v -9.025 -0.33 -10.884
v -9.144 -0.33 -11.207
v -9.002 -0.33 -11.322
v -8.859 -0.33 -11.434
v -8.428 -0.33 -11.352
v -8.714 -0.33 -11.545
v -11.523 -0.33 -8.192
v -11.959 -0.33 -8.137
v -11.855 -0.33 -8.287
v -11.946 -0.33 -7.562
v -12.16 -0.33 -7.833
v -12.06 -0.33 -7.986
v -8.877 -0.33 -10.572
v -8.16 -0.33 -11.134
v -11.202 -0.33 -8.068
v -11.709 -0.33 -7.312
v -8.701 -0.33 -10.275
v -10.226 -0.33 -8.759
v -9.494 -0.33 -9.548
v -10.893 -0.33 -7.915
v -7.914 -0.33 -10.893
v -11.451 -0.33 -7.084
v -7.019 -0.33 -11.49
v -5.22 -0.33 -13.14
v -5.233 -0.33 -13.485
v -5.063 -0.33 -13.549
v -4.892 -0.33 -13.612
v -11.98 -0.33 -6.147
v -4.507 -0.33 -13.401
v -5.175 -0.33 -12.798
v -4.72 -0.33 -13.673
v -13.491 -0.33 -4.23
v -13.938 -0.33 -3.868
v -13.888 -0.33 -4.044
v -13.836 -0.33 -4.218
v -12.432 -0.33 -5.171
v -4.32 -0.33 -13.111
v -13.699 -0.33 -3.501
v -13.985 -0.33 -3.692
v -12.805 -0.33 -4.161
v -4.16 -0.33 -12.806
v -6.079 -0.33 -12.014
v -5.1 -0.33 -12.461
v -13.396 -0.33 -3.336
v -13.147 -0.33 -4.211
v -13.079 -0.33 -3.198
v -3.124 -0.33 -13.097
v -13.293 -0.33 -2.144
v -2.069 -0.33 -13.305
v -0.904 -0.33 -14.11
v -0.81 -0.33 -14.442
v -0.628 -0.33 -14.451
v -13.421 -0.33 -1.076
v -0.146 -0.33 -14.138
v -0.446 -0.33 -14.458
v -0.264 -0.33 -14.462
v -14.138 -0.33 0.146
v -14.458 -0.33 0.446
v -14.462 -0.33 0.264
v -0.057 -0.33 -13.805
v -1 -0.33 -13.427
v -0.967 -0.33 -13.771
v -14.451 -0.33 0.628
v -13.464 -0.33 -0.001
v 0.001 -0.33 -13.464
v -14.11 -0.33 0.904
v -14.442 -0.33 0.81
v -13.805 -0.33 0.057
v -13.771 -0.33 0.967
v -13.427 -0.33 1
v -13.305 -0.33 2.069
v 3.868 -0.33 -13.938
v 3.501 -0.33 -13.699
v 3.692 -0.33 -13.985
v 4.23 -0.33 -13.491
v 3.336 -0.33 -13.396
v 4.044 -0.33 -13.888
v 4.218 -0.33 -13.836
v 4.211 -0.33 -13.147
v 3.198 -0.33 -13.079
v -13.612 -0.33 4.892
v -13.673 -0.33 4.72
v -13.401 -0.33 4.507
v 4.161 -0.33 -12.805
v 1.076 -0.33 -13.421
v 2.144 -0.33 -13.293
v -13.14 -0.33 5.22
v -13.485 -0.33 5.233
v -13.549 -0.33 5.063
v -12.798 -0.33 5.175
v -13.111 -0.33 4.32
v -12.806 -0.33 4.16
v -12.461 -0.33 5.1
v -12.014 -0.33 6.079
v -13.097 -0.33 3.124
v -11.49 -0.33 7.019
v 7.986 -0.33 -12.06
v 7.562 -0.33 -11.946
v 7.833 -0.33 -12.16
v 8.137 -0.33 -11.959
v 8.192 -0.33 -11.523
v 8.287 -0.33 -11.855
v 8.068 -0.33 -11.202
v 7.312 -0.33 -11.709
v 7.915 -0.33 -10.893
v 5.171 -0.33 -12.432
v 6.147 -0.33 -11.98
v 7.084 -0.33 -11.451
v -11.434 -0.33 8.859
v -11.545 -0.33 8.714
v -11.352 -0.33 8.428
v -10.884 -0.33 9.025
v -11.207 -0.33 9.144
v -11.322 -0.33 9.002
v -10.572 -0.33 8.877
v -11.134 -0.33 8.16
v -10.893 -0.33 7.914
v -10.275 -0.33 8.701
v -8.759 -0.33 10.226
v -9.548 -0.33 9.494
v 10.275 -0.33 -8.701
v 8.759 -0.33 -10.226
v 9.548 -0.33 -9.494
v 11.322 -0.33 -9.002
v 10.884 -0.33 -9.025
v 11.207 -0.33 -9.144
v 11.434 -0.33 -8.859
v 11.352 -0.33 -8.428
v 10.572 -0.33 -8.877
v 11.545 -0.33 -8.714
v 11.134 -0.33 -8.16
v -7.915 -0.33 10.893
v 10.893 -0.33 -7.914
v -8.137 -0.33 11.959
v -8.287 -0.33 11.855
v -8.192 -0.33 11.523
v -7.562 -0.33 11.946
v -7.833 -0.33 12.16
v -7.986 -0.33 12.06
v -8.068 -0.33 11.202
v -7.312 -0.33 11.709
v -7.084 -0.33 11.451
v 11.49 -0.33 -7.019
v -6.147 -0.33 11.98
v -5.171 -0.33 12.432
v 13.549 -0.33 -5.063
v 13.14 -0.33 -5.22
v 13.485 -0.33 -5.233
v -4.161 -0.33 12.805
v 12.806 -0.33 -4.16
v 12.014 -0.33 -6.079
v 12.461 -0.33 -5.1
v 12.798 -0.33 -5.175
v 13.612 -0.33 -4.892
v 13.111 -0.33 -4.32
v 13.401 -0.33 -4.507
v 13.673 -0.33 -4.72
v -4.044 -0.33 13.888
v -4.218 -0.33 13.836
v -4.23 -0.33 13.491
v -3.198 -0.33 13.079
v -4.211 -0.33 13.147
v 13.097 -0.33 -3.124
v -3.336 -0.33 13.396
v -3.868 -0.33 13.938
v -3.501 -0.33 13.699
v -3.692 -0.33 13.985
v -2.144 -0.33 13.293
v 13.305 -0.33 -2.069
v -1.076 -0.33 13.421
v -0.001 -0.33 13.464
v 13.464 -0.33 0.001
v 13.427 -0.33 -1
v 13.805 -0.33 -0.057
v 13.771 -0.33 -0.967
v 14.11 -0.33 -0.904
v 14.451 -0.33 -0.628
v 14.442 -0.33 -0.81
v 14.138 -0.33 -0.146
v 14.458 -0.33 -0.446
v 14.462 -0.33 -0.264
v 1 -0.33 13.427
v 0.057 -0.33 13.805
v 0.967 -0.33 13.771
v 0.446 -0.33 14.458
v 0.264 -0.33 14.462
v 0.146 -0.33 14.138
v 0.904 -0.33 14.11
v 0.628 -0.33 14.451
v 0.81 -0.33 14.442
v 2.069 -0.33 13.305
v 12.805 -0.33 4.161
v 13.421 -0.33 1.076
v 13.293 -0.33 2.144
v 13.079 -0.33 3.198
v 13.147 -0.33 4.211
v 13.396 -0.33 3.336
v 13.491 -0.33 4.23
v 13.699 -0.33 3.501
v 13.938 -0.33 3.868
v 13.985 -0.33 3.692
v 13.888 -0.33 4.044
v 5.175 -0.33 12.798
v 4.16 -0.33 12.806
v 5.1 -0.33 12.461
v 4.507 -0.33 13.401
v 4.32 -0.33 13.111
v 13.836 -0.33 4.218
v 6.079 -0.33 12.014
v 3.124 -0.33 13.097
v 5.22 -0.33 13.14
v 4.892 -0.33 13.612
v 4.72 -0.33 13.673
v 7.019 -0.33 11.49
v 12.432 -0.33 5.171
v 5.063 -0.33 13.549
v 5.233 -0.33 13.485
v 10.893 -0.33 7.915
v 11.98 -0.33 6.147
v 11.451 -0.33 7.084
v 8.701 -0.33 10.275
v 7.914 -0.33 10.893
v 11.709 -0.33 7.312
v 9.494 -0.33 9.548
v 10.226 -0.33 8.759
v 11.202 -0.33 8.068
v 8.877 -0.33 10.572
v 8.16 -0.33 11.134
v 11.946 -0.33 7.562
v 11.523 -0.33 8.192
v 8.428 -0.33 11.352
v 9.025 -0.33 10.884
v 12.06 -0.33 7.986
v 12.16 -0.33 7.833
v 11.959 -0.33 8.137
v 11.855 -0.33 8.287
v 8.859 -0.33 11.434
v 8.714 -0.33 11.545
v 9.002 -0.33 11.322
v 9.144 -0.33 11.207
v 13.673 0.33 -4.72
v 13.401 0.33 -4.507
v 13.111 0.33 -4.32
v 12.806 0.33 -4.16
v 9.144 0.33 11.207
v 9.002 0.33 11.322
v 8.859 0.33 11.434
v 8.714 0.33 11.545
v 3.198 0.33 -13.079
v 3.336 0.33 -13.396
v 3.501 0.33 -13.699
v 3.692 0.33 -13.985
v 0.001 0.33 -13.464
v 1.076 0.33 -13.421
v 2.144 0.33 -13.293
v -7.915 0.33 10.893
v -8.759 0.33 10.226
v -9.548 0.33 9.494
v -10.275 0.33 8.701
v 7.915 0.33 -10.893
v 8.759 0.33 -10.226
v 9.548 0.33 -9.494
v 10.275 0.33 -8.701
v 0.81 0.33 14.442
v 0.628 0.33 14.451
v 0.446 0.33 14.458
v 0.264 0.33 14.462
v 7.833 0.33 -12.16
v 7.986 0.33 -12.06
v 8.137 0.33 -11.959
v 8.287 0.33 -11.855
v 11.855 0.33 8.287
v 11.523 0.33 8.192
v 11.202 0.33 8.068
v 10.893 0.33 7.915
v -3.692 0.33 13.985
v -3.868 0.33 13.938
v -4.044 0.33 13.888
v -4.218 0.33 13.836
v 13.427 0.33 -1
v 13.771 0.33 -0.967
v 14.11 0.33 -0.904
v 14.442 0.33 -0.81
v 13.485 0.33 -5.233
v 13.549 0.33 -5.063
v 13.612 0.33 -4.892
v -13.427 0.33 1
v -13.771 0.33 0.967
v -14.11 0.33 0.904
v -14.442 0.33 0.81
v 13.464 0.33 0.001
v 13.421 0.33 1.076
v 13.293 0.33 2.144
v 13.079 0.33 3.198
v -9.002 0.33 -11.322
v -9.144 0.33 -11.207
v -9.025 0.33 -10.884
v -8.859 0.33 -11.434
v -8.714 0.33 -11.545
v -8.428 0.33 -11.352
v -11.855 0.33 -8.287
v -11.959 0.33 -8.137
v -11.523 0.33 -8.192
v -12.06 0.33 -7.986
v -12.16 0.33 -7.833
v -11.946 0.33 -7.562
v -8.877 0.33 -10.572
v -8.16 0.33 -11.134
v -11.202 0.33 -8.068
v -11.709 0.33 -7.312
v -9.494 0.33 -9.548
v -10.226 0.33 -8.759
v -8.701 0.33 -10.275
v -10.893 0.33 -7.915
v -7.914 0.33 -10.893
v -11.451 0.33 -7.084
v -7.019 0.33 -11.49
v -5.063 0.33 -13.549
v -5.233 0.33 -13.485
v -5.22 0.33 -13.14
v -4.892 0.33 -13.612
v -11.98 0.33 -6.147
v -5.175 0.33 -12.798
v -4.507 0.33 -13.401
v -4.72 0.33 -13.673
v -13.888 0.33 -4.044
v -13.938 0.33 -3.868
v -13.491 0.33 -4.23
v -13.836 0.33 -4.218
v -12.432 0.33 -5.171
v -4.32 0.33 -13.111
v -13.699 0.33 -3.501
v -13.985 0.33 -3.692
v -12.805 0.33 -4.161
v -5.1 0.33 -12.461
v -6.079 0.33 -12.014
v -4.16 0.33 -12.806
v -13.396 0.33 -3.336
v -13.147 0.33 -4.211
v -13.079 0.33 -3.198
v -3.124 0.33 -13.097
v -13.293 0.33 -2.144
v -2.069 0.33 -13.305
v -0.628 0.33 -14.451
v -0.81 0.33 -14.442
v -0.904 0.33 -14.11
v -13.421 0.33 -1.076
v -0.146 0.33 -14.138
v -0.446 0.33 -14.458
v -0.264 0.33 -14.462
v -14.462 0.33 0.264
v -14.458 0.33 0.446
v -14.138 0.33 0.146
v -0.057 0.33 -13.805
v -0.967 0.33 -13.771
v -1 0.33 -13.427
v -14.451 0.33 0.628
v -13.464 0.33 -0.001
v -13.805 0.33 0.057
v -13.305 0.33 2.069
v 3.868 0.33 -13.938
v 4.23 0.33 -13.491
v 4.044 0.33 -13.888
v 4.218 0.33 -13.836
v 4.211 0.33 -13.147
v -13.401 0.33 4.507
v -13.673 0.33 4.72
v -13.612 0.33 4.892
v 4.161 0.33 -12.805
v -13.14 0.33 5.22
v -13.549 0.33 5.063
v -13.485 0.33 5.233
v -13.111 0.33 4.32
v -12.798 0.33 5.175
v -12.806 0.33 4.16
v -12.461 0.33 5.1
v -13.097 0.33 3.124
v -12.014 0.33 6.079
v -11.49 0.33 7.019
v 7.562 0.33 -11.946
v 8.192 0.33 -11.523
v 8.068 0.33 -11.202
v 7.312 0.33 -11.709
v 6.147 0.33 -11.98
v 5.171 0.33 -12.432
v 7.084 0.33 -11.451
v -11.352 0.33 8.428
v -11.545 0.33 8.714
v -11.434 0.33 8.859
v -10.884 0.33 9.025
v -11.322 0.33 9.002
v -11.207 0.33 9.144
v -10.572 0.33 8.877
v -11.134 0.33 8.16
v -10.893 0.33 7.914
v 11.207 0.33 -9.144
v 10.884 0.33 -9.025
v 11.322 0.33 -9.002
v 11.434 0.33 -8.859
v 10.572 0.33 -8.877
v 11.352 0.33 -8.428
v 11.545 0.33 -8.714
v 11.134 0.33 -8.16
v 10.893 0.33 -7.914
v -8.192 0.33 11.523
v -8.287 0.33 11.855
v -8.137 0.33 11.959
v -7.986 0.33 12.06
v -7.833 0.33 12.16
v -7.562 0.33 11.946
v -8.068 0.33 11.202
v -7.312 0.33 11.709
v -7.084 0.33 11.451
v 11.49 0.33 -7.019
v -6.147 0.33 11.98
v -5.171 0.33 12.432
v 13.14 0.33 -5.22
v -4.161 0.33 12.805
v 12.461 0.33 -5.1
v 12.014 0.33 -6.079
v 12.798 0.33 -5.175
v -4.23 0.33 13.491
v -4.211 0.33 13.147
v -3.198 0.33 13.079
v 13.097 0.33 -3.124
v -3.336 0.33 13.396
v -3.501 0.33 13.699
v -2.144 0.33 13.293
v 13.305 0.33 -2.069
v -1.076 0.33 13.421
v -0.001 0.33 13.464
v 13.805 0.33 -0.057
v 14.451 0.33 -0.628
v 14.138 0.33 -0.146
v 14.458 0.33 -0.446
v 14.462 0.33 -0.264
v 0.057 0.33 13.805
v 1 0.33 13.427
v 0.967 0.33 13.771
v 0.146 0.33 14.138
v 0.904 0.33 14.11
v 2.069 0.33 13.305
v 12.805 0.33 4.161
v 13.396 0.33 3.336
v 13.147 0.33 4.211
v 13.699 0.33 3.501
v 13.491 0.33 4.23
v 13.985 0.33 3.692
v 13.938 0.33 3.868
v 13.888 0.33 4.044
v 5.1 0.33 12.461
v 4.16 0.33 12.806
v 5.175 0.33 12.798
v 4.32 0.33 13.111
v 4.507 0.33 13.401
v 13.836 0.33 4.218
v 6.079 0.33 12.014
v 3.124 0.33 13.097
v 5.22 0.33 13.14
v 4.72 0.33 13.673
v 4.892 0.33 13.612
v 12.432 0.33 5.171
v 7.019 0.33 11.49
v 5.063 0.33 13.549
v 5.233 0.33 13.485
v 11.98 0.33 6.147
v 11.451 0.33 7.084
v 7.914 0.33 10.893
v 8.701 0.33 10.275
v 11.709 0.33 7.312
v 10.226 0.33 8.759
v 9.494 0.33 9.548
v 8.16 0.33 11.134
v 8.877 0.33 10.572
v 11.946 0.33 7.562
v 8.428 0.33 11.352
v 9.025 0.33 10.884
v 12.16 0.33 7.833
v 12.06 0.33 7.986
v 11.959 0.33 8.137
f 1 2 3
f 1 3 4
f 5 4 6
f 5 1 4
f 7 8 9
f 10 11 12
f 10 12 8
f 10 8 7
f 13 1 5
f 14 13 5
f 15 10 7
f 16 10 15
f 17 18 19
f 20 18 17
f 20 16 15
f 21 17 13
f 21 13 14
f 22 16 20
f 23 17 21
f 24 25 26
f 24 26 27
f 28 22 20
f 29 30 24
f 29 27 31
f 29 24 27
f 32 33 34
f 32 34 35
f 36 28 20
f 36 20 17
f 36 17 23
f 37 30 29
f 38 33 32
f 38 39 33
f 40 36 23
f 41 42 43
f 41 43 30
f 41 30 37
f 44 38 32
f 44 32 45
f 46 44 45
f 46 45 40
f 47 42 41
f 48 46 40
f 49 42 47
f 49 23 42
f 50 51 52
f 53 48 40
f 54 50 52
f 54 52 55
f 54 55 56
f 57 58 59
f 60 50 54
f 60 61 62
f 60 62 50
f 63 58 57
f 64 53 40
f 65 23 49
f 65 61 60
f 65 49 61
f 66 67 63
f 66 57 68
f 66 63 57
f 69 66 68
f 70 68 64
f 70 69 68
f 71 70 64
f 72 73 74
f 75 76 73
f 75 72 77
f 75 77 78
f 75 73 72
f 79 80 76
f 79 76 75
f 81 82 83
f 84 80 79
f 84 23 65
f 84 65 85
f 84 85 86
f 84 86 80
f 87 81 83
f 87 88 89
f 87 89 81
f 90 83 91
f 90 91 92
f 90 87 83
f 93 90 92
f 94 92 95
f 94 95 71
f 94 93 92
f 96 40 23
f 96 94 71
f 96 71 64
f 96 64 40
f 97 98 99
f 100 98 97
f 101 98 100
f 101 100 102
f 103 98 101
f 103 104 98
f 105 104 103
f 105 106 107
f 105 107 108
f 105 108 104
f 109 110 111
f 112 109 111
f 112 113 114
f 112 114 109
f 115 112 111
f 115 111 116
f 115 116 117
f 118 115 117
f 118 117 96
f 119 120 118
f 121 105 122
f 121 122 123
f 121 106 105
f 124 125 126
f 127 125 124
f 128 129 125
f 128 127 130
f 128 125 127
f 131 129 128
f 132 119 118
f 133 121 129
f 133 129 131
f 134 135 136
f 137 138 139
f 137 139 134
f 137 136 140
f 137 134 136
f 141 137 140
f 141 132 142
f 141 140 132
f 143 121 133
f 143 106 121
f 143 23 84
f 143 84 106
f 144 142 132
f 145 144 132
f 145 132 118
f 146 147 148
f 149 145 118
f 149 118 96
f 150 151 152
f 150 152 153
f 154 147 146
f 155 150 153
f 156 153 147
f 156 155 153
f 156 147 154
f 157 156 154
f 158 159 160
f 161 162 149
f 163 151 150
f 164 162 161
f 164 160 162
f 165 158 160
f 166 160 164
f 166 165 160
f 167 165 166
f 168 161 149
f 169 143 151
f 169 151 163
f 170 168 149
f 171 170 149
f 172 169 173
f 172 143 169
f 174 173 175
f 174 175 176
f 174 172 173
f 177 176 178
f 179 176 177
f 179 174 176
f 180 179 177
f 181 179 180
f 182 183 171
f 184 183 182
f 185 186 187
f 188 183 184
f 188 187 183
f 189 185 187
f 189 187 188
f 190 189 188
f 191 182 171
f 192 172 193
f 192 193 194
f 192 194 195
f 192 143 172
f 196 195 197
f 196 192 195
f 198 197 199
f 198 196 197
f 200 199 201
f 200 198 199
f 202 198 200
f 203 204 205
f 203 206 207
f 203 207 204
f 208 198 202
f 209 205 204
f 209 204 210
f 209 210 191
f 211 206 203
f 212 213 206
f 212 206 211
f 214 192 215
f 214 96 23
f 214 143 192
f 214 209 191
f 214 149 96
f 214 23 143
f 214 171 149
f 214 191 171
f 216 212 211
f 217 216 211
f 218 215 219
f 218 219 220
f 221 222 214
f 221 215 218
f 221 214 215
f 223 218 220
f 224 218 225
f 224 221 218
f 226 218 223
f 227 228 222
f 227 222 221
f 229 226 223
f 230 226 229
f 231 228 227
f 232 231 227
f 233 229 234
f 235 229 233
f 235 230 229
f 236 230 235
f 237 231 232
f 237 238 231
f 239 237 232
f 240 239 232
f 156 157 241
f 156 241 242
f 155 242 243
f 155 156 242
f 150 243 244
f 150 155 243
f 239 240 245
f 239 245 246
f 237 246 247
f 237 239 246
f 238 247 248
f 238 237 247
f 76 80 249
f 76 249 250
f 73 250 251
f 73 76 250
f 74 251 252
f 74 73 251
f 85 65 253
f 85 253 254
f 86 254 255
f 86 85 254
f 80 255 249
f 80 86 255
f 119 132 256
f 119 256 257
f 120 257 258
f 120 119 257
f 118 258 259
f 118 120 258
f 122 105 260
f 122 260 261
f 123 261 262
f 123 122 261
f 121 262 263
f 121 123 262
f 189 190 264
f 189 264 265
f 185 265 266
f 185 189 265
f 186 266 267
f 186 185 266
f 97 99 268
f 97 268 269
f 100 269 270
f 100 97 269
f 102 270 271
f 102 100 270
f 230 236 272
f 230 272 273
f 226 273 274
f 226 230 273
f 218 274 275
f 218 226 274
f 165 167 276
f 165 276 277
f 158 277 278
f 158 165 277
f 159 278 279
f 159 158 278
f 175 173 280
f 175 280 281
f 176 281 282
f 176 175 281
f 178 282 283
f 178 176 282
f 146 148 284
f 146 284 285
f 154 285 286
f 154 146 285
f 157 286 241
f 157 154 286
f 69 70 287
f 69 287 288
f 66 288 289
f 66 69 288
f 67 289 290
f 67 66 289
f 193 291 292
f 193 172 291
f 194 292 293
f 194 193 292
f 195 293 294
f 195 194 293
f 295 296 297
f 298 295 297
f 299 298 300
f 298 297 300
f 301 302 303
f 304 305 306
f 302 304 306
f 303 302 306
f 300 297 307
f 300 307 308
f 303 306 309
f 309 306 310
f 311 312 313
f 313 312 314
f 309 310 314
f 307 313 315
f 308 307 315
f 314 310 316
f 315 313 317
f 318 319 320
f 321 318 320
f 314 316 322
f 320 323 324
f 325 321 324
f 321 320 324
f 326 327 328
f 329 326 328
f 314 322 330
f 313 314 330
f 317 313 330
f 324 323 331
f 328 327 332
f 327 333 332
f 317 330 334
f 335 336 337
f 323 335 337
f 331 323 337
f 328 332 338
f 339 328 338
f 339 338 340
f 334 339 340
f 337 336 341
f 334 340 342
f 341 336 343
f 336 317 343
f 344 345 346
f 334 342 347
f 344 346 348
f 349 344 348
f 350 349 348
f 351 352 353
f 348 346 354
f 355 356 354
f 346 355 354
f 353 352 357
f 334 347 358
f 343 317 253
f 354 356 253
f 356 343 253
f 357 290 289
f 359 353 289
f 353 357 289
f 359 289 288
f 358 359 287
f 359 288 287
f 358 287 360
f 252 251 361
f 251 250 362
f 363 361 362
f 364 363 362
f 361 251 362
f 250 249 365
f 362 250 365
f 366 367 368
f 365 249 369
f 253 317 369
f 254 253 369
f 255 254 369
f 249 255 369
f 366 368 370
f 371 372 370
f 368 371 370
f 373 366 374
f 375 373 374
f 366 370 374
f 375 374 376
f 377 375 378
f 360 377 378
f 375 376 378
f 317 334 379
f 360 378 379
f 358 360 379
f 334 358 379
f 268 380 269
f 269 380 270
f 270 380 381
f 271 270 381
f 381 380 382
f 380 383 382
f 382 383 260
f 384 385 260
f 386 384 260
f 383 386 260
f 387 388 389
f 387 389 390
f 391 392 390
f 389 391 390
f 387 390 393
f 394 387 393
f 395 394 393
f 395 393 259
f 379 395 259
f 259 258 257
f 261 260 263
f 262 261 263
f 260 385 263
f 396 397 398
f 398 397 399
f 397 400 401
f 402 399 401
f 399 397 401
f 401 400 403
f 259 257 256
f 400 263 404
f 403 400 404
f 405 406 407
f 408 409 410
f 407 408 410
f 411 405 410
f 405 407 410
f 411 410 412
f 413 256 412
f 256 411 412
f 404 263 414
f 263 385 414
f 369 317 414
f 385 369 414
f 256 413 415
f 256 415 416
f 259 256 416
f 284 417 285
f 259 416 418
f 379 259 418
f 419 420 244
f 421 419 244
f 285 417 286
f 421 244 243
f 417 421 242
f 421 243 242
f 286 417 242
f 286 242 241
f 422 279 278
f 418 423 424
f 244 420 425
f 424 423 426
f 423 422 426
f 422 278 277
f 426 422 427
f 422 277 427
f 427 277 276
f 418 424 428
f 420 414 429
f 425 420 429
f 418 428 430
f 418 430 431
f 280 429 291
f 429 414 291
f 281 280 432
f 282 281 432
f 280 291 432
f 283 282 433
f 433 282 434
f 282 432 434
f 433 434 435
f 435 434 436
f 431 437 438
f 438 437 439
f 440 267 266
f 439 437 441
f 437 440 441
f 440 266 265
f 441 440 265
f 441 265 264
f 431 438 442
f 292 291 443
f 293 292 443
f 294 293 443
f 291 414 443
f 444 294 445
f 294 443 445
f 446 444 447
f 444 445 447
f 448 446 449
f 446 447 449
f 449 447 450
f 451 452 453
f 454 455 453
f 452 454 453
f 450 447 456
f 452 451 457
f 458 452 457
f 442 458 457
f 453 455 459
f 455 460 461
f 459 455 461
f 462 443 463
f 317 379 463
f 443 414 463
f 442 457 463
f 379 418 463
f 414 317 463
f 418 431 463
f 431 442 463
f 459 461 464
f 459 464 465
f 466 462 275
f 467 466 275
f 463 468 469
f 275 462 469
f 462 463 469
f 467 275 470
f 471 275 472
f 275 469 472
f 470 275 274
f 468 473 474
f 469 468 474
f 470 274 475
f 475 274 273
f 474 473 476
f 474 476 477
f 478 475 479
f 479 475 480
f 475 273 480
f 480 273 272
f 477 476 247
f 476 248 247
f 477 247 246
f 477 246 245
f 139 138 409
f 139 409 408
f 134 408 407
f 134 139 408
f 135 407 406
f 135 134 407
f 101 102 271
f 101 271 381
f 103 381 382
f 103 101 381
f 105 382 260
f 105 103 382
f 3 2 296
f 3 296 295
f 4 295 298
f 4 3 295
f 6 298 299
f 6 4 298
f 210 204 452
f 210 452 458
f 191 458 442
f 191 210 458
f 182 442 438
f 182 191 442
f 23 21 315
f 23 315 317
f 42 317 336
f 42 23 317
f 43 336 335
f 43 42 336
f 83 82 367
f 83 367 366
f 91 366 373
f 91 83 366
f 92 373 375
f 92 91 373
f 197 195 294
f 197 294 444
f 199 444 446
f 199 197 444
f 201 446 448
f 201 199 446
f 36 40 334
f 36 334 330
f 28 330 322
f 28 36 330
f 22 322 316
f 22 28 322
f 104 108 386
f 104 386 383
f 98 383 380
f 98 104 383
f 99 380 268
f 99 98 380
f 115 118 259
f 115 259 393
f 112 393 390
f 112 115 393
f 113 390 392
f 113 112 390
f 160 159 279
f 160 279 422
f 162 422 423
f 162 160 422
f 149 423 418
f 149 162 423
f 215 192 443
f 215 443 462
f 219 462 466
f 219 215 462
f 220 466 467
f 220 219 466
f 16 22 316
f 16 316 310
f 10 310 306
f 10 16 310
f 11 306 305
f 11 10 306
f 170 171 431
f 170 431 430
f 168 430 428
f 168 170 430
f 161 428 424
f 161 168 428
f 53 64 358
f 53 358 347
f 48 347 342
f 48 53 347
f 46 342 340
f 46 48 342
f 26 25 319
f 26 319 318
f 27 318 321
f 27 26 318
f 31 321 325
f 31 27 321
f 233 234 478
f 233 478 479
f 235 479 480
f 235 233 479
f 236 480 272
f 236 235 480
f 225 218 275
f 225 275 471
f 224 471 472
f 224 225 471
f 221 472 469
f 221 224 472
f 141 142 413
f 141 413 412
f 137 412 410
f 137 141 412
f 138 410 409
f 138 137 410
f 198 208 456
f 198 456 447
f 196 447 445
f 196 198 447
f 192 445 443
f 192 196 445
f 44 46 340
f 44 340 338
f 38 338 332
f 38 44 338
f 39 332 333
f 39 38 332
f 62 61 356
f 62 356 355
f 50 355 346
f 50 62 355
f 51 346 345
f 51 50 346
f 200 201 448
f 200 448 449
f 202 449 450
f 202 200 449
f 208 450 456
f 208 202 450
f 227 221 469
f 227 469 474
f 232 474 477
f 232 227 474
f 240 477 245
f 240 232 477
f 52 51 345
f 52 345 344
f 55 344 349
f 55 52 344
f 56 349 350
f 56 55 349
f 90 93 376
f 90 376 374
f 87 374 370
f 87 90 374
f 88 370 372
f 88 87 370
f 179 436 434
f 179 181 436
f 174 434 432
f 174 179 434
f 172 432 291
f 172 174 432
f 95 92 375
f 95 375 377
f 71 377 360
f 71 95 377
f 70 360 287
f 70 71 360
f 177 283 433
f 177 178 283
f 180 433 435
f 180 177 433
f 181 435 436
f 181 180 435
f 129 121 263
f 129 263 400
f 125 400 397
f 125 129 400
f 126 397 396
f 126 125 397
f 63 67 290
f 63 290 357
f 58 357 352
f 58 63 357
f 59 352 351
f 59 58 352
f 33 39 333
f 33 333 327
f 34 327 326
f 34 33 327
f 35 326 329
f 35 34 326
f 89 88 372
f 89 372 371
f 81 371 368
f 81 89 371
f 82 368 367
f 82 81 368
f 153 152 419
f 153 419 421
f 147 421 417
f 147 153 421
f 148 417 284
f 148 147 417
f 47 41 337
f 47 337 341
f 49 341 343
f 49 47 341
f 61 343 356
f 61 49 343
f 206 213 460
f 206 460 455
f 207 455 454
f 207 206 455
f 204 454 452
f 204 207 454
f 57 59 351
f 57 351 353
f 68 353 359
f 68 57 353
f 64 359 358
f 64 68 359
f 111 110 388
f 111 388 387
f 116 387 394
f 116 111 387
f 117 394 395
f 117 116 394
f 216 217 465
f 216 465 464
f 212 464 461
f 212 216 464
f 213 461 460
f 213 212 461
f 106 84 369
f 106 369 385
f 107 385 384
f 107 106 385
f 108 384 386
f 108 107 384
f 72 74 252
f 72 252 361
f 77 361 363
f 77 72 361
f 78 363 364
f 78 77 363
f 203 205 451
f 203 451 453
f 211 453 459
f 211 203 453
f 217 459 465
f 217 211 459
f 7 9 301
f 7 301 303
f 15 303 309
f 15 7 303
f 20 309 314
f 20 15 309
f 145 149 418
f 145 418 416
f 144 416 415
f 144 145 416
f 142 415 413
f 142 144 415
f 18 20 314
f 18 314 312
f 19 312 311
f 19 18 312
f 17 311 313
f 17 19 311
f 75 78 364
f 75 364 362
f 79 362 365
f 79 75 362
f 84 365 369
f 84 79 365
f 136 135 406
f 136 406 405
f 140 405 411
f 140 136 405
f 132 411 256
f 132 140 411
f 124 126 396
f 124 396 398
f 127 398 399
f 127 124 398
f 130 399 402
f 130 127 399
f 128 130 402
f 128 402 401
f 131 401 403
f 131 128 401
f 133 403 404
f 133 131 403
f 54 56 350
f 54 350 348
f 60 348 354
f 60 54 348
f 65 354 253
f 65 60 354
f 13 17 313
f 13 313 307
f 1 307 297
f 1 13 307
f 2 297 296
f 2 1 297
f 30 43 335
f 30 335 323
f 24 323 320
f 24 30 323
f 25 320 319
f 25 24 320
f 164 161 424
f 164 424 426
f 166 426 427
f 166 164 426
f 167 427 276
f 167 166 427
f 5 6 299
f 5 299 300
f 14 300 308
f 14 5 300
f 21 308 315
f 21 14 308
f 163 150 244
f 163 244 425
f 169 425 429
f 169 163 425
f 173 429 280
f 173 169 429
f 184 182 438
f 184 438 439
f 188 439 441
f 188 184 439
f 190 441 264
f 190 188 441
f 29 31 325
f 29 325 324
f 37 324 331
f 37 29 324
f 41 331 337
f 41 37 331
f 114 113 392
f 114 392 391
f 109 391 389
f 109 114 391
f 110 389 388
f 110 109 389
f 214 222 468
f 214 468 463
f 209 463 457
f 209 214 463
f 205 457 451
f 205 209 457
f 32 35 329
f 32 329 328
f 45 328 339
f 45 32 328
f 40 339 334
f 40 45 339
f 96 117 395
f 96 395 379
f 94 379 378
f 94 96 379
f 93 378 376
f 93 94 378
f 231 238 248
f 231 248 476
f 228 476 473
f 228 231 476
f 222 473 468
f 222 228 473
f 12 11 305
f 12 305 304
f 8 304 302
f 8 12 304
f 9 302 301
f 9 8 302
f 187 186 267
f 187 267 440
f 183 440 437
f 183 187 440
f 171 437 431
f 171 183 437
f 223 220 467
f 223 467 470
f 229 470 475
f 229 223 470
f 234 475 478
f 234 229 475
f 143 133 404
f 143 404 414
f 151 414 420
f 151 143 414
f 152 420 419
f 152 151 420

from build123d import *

# Parameters (mm, degrees)
F3_DEPTH      = 0.33
F3_DEPTH_BACK = 0.33


with BuildPart() as f3:
    # F2 (on Front) → F3 (new body, two sides)
    with BuildSketch(Plane.XZ) as f3_sk:
        with BuildLine():
            ThreePointArc((13.427331249, -0.9997678629), (13.4552046036, -0.5002292714), (13.4645, 0))
            ThreePointArc((13.4645, 0), (13.4644999955, 0.0003469704), (13.4644999821, 0.0006939409))
            ThreePointArc((13.4644999821, 0.0006939409), (13.3677602926, 1.6111315933), (13.0790961409, 3.1984378043))
            ThreePointArc((13.0790961409, 3.1984378043), (12.9511444719, 3.68247432), (12.8052860071, 4.1614192922))
            ThreePointArc((12.8052860071, 4.1614192922), (12.215628492, 5.6631423075), (11.4505879751, 7.0835580943))
            ThreePointArc((11.4505879751, 7.0835580943), (11.1793231973, 7.5043649366), (10.8926014181, 7.9147959289))
            ThreePointArc((10.8926014181, 7.9147959289), (9.8677458634, 9.1608051953), (8.7012164773, 10.275290364))
            ThreePointArc((8.7012164773, 10.275290364), (8.3131918771, 10.5916760271), (7.913673109, 10.8934171945))
            ThreePointArc((7.913673109, 10.8934171945), (6.553939517, 11.7617446434), (5.1001092858, 12.4612056208))
            ThreePointArc((5.1001092858, 12.4612056208), (4.6333074147, 12.6422000716), (4.1600993383, 12.8057148862))
            ThreePointArc((4.1600993383, 12.8057148862), (2.5985879067, 13.211362577), (0.9997678629, 13.427331249))
            ThreePointArc((0.9997678629, 13.427331249), (0.4998825403, 13.4552174897), (-0.0006939409, 13.4644999821))
            ThreePointArc((-0.0006939409, 13.4644999821), (-1.6111315933, 13.3677602926), (-3.1984378043, 13.0790961409))
            ThreePointArc((-3.1984378043, 13.0790961409), (-3.68247432, 12.9511444719), (-4.1614192922, 12.8052860071))
            ThreePointArc((-4.1614192922, 12.8052860071), (-5.6631423075, 12.215628492), (-7.0835580943, 11.4505879751))
            ThreePointArc((-7.0835580943, 11.4505879751), (-7.5043649366, 11.1793231973), (-7.9147959289, 10.8926014181))
            ThreePointArc((-7.9147959289, 10.8926014181), (-9.1608051953, 9.8677458634), (-10.275290364, 8.7012164773))
            ThreePointArc((-10.275290364, 8.7012164773), (-10.5916760271, 8.3131918771), (-10.8934171945, 7.913673109))
            ThreePointArc((-10.8934171945, 7.913673109), (-11.7617446434, 6.553939517), (-12.4612056208, 5.1001092858))
            ThreePointArc((-12.4612056208, 5.1001092858), (-12.6422000716, 4.6333074147), (-12.8057148862, 4.1600993383))
            ThreePointArc((-12.8057148862, 4.1600993383), (-13.211362577, 2.5985879067), (-13.427331249, 0.9997678629))
            ThreePointArc((-13.427331249, 0.9997678629), (-13.4552174897, 0.4998825403), (-13.4644999821, -0.0006939409))
            ThreePointArc((-13.4644999821, -0.0006939409), (-13.3677602926, -1.6111315933), (-13.0790961409, -3.1984378043))
            ThreePointArc((-13.0790961409, -3.1984378043), (-12.9511444719, -3.68247432), (-12.8052860071, -4.1614192922))
            ThreePointArc((-12.8052860071, -4.1614192922), (-12.215628492, -5.6631423075), (-11.4505879751, -7.0835580943))
            ThreePointArc((-11.4505879751, -7.0835580943), (-11.1793231973, -7.5043649366), (-10.8926014181, -7.9147959289))
            ThreePointArc((-10.8926014181, -7.9147959289), (-9.8677458634, -9.1608051953), (-8.7012164773, -10.275290364))
            ThreePointArc((-8.7012164773, -10.275290364), (-8.3131918771, -10.5916760271), (-7.913673109, -10.8934171945))
            ThreePointArc((-7.913673109, -10.8934171945), (-6.553939517, -11.7617446434), (-5.1001092858, -12.4612056208))
            ThreePointArc((-5.1001092858, -12.4612056208), (-4.6333074147, -12.6422000716), (-4.1600993383, -12.8057148862))
            ThreePointArc((-4.1600993383, -12.8057148862), (-2.5985879067, -13.211362577), (-0.9997678629, -13.427331249))
            ThreePointArc((-0.9997678629, -13.427331249), (-0.4998825403, -13.4552174897), (0.0006939409, -13.4644999821))
            ThreePointArc((0.0006939409, -13.4644999821), (1.6111315933, -13.3677602926), (3.1984378043, -13.0790961409))
            ThreePointArc((3.1984378043, -13.0790961409), (3.68247432, -12.9511444719), (4.1614192922, -12.8052860071))
            ThreePointArc((4.1614192922, -12.8052860071), (5.6631423075, -12.215628492), (7.0835580943, -11.4505879751))
            ThreePointArc((7.0835580943, -11.4505879751), (7.5043649366, -11.1793231973), (7.9147959289, -10.8926014181))
            ThreePointArc((7.9147959289, -10.8926014181), (9.1608051953, -9.8677458634), (10.275290364, -8.7012164773))
            ThreePointArc((10.275290364, -8.7012164773), (10.5916760271, -8.3131918771), (10.8934171945, -7.913673109))
            ThreePointArc((10.8934171945, -7.913673109), (11.7617446434, -6.553939517), (12.4612056208, -5.1001092858))
            ThreePointArc((12.4612056208, -5.1001092858), (12.6422000716, -4.6333074147), (12.8057148862, -4.1600993383))
            ThreePointArc((12.8057148862, -4.1600993383), (13.211362577, -2.5985879067), (13.427331249, -0.9997678629))
        make_face()
        with BuildLine():
            ThreePointArc((13.4644999821, 0.0006939409), (13.4644999955, 0.0003469704), (13.4645, 0))
            ThreePointArc((13.4645, 0), (13.4552046036, -0.5002292714), (13.427331249, -0.9997678629))
            ThreePointArc((13.427331249, -0.9997678629), (13.9409777525, -0.9393106229), (14.4417920292, -0.8101871604))
            ThreePointArc((14.4417920292, -0.8101871604), (14.4545280835, -0.5370085042), (14.4620971963, -0.2636378879))
            ThreePointArc((14.4620971963, -0.2636378879), (13.9722445576, -0.0977095878), (13.4644999821, 0.0006939409))
        make_face()
        with BuildLine():
            ThreePointArc((12.8052860071, 4.1614192922), (12.9511444719, 3.68247432), (13.0790961409, 3.1984378043))
            ThreePointArc((13.0790961409, 3.1984378043), (13.5489206805, 3.4146615549), (13.9853220175, 3.692225388))
            ThreePointArc((13.9853220175, 3.692225388), (13.9130178777, 3.9559693863), (13.8357403655, 4.2182992767))
            ThreePointArc((13.8357403655, 4.2182992767), (13.3185881569, 4.2247336777), (12.8052860071, 4.1614192922))
        make_face()
        with BuildLine():
            ThreePointArc((13.6728031901, -4.7197683392), (13.2582003107, -4.410588358), (12.8057148862, -4.1600993383))
            ThreePointArc((12.8057148862, -4.1600993383), (12.6422000716, -4.6333074147), (12.4612056208, -5.1001092858))
            ThreePointArc((12.4612056208, -5.1001092858), (12.9683947895, -5.2013365325), (13.4845988152, -5.2332929446))
            ThreePointArc((13.4845988152, -5.2332929446), (13.5811283699, -4.9774202606), (13.6728031901, -4.7197683392))
        make_face()
        with BuildLine():
            ThreePointArc((10.8926014181, 7.9147959289), (11.1793231973, 7.5043649366), (11.4505879751, 7.0835580943))
            ThreePointArc((11.4505879751, 7.0835580943), (11.8306008514, 7.4343828685), (12.1598712453, 7.8332171901))
            ThreePointArc((12.1598712453, 7.8332171901), (12.0096045443, 8.0617094303), (11.8550448685, 8.2873199175))
            ThreePointArc((11.8550448685, 8.2873199175), (11.3612155514, 8.1336305754), (10.8926014181, 7.9147959289))
        make_face()
        with BuildLine():
            ThreePointArc((11.5451199436, -8.7138949808), (11.246351042, -8.2917280094), (10.8934171945, -7.913673109))
            ThreePointArc((10.8934171945, -7.913673109), (10.5916760271, -8.3131918771), (10.275290364, -8.7012164773))
            ThreePointArc((10.275290364, -8.7012164773), (10.7263749885, -8.9542193824), (11.2074391164, -9.1441275528))
            ThreePointArc((11.2074391164, -9.1441275528), (11.3783131861, -8.9306074423), (11.5451199436, -8.7138949808))
        make_face()
        with BuildLine():
            ThreePointArc((7.913673109, 10.8934171945), (8.3131918771, 10.5916760271), (8.7012164773, 10.275290364))
            ThreePointArc((8.7012164773, 10.275290364), (8.9542193824, 10.7263749885), (9.1441275528, 11.2074391164))
            ThreePointArc((9.1441275528, 11.2074391164), (8.9306074423, 11.3783131861), (8.7138949808, 11.5451199436))
            ThreePointArc((8.7138949808, 11.5451199436), (8.2917280094, 11.246351042), (7.913673109, 10.8934171945))
        make_face()
        with BuildLine():
            ThreePointArc((8.2873199175, -11.8550448685), (8.1336305754, -11.3612155514), (7.9147959289, -10.8926014181))
            ThreePointArc((7.9147959289, -10.8926014181), (7.5043649366, -11.1793231973), (7.0835580943, -11.4505879751))
            ThreePointArc((7.0835580943, -11.4505879751), (7.4343828685, -11.8306008514), (7.8332171901, -12.1598712453))
            ThreePointArc((7.8332171901, -12.1598712453), (8.0617094303, -12.0096045443), (8.2873199175, -11.8550448685))
        make_face()
        with BuildLine():
            ThreePointArc((4.1600993383, 12.8057148862), (4.6333074147, 12.6422000716), (5.1001092858, 12.4612056208))
            ThreePointArc((5.1001092858, 12.4612056208), (5.2013365325, 12.9683947895), (5.2332929446, 13.4845988152))
            ThreePointArc((5.2332929446, 13.4845988152), (4.9774202606, 13.5811283699), (4.7197683392, 13.6728031901))
            ThreePointArc((4.7197683392, 13.6728031901), (4.410588358, 13.2582003107), (4.1600993383, 12.8057148862))
        make_face()
        with BuildLine():
            ThreePointArc((4.2182992767, -13.8357403655), (4.2247336777, -13.3185881569), (4.1614192922, -12.8052860071))
            ThreePointArc((4.1614192922, -12.8052860071), (3.68247432, -12.9511444719), (3.1984378043, -13.0790961409))
            ThreePointArc((3.1984378043, -13.0790961409), (3.4146615549, -13.5489206805), (3.692225388, -13.9853220175))
            ThreePointArc((3.692225388, -13.9853220175), (3.9559693863, -13.9130178777), (4.2182992767, -13.8357403655))
        make_face()
        with BuildLine():
            ThreePointArc((-0.0006939409, 13.4644999821), (0.4998825403, 13.4552174897), (0.9997678629, 13.427331249))
            ThreePointArc((0.9997678629, 13.427331249), (0.9393106229, 13.9409777525), (0.8101871604, 14.4417920292))
            ThreePointArc((0.8101871604, 14.4417920292), (0.5370085042, 14.4545280835), (0.2636378879, 14.4620971963))
            ThreePointArc((0.2636378879, 14.4620971963), (0.0977095878, 13.9722445576), (-0.0006939409, 13.4644999821))
        make_face()
        with BuildLine():
            ThreePointArc((-0.2636378879, -14.4620971963), (-0.0977095878, -13.9722445576), (0.0006939409, -13.4644999821))
            ThreePointArc((0.0006939409, -13.4644999821), (-0.4998825403, -13.4552174897), (-0.9997678629, -13.427331249))
            ThreePointArc((-0.9997678629, -13.427331249), (-0.9393106229, -13.9409777525), (-0.8101871604, -14.4417920292))
            ThreePointArc((-0.8101871604, -14.4417920292), (-0.5370085042, -14.4545280835), (-0.2636378879, -14.4620971963))
        make_face()
        with BuildLine():
            ThreePointArc((-4.1614192922, 12.8052860071), (-3.68247432, 12.9511444719), (-3.1984378043, 13.0790961409))
            ThreePointArc((-3.1984378043, 13.0790961409), (-3.4146615549, 13.5489206805), (-3.692225388, 13.9853220175))
            ThreePointArc((-3.692225388, 13.9853220175), (-3.9559693863, 13.9130178777), (-4.2182992767, 13.8357403655))
            ThreePointArc((-4.2182992767, 13.8357403655), (-4.2247336777, 13.3185881569), (-4.1614192922, 12.8052860071))
        make_face()
        with BuildLine():
            ThreePointArc((-4.7197683392, -13.6728031901), (-4.410588358, -13.2582003107), (-4.1600993383, -12.8057148862))
            ThreePointArc((-4.1600993383, -12.8057148862), (-4.6333074147, -12.6422000716), (-5.1001092858, -12.4612056208))
            ThreePointArc((-5.1001092858, -12.4612056208), (-5.2013365325, -12.9683947895), (-5.2332929446, -13.4845988152))
            ThreePointArc((-5.2332929446, -13.4845988152), (-4.9774202606, -13.5811283699), (-4.7197683392, -13.6728031901))
        make_face()
        with BuildLine():
            ThreePointArc((-7.9147959289, 10.8926014181), (-7.5043649366, 11.1793231973), (-7.0835580943, 11.4505879751))
            ThreePointArc((-7.0835580943, 11.4505879751), (-7.4343828685, 11.8306008514), (-7.8332171901, 12.1598712453))
            ThreePointArc((-7.8332171901, 12.1598712453), (-8.0617094303, 12.0096045443), (-8.2873199175, 11.8550448685))
            ThreePointArc((-8.2873199175, 11.8550448685), (-8.1336305754, 11.3612155514), (-7.9147959289, 10.8926014181))
        make_face()
        with BuildLine():
            ThreePointArc((-8.7138949808, -11.5451199436), (-8.2917280094, -11.246351042), (-7.913673109, -10.8934171945))
            ThreePointArc((-7.913673109, -10.8934171945), (-8.3131918771, -10.5916760271), (-8.7012164773, -10.275290364))
            ThreePointArc((-8.7012164773, -10.275290364), (-8.9542193824, -10.7263749885), (-9.1441275528, -11.2074391164))
            ThreePointArc((-9.1441275528, -11.2074391164), (-8.9306074423, -11.3783131861), (-8.7138949808, -11.5451199436))
        make_face()
        with BuildLine():
            ThreePointArc((-10.8934171945, 7.913673109), (-10.5916760271, 8.3131918771), (-10.275290364, 8.7012164773))
            ThreePointArc((-10.275290364, 8.7012164773), (-10.7263749885, 8.9542193824), (-11.2074391164, 9.1441275528))
            ThreePointArc((-11.2074391164, 9.1441275528), (-11.3783131861, 8.9306074423), (-11.5451199436, 8.7138949808))
            ThreePointArc((-11.5451199436, 8.7138949808), (-11.246351042, 8.2917280094), (-10.8934171945, 7.913673109))
        make_face()
        with BuildLine():
            ThreePointArc((-11.8550448685, -8.2873199175), (-11.3612155514, -8.1336305754), (-10.8926014181, -7.9147959289))
            ThreePointArc((-10.8926014181, -7.9147959289), (-11.1793231973, -7.5043649366), (-11.4505879751, -7.0835580943))
            ThreePointArc((-11.4505879751, -7.0835580943), (-11.8306008514, -7.4343828685), (-12.1598712453, -7.8332171901))
            ThreePointArc((-12.1598712453, -7.8332171901), (-12.0096045443, -8.0617094303), (-11.8550448685, -8.2873199175))
        make_face()
        with BuildLine():
            ThreePointArc((-12.8057148862, 4.1600993383), (-12.6422000716, 4.6333074147), (-12.4612056208, 5.1001092858))
            ThreePointArc((-12.4612056208, 5.1001092858), (-12.9683947895, 5.2013365325), (-13.4845988152, 5.2332929446))
            ThreePointArc((-13.4845988152, 5.2332929446), (-13.5811283699, 4.9774202606), (-13.6728031901, 4.7197683392))
            ThreePointArc((-13.6728031901, 4.7197683392), (-13.2582003107, 4.410588358), (-12.8057148862, 4.1600993383))
        make_face()
        with BuildLine():
            ThreePointArc((-13.8357403655, -4.2182992767), (-13.3185881569, -4.2247336777), (-12.8052860071, -4.1614192922))
            ThreePointArc((-12.8052860071, -4.1614192922), (-12.9511444719, -3.68247432), (-13.0790961409, -3.1984378043))
            ThreePointArc((-13.0790961409, -3.1984378043), (-13.5489206805, -3.4146615549), (-13.9853220175, -3.692225388))
            ThreePointArc((-13.9853220175, -3.692225388), (-13.9130178777, -3.9559693863), (-13.8357403655, -4.2182992767))
        make_face()
        with BuildLine():
            ThreePointArc((-13.4644999821, -0.0006939409), (-13.4552174897, 0.4998825403), (-13.427331249, 0.9997678629))
            ThreePointArc((-13.427331249, 0.9997678629), (-13.9409777525, 0.9393106229), (-14.4417920292, 0.8101871604))
            ThreePointArc((-14.4417920292, 0.8101871604), (-14.4545280835, 0.5370085042), (-14.4620971963, 0.2636378879))
            ThreePointArc((-14.4620971963, 0.2636378879), (-13.9722445576, 0.0977095878), (-13.4644999821, -0.0006939409))
        make_face()
    extrude(amount=F3_DEPTH)
    extrude(f3_sk.sketch, amount=-F3_DEPTH_BACK)


solid = f3.part
